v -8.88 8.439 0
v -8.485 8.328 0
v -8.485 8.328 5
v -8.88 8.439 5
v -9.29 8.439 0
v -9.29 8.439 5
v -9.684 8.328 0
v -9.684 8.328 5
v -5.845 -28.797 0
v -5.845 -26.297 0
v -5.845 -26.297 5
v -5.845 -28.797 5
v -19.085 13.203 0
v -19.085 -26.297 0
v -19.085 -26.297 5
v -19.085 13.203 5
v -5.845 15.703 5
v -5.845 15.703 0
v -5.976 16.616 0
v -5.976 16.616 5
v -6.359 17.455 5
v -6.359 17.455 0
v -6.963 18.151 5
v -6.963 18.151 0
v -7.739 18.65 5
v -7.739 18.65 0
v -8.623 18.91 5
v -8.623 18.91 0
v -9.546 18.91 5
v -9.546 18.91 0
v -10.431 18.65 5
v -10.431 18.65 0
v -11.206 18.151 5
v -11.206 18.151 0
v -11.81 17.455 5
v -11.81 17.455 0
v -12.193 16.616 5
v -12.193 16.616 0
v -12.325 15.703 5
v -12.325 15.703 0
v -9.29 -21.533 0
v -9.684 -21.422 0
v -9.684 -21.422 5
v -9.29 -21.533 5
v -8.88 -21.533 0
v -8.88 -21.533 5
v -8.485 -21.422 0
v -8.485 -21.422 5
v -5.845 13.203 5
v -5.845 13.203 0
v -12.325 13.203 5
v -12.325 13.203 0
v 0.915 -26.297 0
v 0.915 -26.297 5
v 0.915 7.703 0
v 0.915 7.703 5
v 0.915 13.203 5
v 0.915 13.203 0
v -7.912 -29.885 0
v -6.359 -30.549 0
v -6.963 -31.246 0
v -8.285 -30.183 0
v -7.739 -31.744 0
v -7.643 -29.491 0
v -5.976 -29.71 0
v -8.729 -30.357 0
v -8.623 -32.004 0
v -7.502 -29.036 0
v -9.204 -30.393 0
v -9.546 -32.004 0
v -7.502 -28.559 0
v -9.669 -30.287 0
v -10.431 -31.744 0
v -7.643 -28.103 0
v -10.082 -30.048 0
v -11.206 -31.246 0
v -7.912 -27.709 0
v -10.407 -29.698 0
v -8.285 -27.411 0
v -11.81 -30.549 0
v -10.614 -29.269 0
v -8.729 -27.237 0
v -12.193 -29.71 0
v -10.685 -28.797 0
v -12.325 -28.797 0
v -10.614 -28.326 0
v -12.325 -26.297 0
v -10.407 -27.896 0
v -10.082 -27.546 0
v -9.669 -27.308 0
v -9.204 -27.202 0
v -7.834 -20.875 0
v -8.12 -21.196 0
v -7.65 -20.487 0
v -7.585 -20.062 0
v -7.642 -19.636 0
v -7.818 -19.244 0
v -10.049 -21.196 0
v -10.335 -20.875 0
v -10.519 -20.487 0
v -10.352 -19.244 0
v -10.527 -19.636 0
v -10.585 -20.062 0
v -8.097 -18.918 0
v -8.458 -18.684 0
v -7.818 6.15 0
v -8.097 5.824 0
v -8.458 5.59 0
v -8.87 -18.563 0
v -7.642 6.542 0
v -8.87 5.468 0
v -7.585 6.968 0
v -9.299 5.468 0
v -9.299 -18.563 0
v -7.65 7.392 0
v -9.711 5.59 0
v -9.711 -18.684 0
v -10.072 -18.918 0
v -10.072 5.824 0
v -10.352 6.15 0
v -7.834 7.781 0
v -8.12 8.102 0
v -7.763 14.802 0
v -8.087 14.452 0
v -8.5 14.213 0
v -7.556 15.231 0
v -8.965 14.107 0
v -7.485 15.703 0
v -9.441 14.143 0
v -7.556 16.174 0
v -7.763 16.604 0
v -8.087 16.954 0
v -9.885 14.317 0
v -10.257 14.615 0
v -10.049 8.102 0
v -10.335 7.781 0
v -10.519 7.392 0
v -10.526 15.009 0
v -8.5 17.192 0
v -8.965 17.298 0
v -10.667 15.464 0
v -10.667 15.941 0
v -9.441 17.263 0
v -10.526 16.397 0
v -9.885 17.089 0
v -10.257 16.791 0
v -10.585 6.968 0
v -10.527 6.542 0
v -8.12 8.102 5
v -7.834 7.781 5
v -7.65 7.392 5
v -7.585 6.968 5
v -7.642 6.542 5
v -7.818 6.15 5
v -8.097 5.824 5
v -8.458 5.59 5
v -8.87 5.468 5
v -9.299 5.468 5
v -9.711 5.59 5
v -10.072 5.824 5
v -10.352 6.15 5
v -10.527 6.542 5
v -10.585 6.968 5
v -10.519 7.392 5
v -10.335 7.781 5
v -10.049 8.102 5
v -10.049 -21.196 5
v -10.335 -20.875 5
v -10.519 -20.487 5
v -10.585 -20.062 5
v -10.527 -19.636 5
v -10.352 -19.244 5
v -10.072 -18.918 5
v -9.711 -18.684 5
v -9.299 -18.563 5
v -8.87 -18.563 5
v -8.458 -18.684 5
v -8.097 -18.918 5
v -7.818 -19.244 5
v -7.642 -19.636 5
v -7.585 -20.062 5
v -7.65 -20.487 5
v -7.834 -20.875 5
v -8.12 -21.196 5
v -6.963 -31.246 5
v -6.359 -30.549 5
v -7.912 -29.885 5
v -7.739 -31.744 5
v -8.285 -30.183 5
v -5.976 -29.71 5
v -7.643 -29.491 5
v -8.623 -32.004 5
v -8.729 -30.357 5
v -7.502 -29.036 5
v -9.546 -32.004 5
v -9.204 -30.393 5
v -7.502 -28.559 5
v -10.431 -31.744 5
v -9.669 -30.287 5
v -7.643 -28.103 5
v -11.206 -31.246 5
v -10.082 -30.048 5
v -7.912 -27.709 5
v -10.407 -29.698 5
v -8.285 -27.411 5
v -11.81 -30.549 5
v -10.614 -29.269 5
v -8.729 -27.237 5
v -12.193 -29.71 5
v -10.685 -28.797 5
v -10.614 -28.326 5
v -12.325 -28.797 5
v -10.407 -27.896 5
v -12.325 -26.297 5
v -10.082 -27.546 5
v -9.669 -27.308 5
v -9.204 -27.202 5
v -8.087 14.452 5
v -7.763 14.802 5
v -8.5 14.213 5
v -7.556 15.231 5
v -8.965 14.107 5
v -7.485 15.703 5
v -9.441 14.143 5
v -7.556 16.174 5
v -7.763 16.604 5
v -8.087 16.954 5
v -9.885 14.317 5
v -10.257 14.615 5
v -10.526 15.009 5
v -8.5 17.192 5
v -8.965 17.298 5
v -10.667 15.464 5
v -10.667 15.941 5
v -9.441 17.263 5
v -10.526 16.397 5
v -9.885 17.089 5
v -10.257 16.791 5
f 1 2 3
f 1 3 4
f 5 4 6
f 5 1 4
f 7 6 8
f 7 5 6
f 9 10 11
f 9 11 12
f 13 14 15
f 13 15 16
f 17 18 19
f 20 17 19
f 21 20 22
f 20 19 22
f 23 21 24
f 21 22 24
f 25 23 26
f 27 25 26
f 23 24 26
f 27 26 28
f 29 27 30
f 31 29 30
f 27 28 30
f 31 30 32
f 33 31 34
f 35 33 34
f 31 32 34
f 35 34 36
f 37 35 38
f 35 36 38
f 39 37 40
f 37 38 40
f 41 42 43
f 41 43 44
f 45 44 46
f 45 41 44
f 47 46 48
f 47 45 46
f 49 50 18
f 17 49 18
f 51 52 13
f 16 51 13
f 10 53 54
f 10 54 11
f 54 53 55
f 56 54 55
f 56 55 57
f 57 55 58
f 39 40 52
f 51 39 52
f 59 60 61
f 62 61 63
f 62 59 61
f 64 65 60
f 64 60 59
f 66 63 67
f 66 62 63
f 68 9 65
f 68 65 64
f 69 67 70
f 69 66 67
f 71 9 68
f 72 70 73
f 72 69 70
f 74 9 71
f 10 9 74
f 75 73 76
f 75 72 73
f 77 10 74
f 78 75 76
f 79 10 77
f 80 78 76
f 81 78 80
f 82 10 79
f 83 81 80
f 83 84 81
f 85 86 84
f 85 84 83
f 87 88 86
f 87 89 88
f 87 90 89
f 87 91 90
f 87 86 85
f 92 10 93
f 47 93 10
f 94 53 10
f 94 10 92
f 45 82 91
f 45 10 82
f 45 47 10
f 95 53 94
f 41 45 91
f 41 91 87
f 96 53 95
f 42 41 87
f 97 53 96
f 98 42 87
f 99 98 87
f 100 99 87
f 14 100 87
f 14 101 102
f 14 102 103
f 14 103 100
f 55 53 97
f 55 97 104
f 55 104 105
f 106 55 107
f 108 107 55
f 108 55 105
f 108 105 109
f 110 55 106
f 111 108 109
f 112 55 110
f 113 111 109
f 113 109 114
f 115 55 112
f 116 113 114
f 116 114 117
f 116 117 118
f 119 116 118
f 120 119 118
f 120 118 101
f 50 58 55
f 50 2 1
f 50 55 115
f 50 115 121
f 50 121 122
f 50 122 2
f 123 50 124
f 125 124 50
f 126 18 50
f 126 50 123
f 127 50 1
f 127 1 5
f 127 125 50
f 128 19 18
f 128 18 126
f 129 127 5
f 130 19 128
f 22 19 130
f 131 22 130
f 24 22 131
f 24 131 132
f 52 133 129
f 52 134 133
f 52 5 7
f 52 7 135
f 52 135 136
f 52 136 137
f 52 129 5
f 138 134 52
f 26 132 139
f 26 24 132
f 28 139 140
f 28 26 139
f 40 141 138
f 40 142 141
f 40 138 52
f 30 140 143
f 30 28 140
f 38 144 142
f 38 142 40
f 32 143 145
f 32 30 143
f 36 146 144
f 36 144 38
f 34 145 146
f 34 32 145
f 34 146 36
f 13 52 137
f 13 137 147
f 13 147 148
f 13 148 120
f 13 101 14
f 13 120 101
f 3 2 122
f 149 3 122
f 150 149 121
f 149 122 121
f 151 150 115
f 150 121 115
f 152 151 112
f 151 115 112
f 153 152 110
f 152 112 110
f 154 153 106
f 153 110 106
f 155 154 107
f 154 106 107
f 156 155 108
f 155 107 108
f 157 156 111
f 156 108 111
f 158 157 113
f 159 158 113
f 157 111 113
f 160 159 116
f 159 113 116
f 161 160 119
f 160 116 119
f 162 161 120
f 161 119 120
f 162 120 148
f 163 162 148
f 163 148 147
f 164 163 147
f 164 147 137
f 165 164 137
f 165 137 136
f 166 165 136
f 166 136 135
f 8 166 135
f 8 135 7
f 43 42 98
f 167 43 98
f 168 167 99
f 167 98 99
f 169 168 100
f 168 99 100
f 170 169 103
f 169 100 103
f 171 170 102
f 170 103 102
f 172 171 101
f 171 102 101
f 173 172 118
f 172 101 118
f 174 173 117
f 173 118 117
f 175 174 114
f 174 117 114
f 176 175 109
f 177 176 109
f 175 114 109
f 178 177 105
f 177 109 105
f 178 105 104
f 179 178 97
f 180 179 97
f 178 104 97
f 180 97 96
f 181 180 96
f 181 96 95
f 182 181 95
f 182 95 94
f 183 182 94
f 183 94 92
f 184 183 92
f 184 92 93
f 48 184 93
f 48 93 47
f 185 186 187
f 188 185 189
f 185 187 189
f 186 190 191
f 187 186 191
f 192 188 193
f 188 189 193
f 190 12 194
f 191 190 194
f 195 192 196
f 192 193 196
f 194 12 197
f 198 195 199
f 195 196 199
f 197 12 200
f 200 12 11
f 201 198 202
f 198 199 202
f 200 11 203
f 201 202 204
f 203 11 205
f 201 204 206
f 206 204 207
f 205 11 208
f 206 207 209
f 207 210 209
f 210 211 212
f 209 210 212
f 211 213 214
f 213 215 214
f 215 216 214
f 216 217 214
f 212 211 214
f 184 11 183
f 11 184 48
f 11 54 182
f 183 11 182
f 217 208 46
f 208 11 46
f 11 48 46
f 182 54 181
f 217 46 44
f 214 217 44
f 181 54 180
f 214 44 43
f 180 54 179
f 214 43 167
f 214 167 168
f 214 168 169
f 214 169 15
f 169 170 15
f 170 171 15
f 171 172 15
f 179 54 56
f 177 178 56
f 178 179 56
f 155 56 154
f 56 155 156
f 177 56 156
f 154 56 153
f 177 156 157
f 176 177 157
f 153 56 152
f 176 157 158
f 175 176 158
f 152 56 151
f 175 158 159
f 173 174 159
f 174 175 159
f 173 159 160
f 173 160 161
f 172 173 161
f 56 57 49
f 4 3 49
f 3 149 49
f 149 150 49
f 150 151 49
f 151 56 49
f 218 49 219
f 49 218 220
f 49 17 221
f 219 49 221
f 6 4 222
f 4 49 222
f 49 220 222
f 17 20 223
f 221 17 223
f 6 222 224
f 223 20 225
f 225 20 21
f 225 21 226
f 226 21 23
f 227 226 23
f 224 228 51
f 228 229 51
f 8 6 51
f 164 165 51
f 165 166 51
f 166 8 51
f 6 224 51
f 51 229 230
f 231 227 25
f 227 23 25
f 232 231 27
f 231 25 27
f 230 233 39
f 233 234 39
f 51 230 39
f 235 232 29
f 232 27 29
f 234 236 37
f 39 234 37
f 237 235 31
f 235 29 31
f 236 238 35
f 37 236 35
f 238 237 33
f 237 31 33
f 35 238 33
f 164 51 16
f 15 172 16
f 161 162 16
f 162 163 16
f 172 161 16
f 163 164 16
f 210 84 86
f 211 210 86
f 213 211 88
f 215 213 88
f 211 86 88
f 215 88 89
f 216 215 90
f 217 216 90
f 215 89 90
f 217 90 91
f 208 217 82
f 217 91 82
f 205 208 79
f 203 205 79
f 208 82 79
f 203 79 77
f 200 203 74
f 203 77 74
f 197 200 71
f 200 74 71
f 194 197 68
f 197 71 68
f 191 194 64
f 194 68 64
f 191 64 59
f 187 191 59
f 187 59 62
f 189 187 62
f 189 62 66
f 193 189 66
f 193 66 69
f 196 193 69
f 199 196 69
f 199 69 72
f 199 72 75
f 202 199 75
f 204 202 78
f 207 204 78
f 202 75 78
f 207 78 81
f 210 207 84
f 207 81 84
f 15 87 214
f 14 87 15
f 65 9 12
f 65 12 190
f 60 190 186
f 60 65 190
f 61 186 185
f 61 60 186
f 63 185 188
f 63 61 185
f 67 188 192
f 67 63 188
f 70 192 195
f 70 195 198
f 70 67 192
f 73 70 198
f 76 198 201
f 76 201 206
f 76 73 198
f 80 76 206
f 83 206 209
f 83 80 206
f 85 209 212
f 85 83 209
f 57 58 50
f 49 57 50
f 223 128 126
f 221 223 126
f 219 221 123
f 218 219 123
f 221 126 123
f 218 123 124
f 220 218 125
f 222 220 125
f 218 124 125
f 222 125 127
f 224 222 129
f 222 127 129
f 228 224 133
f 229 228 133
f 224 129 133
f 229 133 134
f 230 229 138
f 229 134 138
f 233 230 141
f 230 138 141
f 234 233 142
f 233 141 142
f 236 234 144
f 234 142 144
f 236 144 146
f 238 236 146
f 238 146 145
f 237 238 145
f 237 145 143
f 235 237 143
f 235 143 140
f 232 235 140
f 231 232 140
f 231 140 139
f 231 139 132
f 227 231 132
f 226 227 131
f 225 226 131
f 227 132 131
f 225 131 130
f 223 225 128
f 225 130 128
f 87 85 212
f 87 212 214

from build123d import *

# Parameters (mm, degrees)
ESQUISSE1_R             = 1
ESQUISSE1_R_2           = 1.5
BOSS_EXTRU_1_DEPTH      = 5
ENL_V_MAT_EXTRU_1_DEPTH = 5
ESQUISSE3_W             = 20
ESQUISSE3_H             = 34
BOSS_EXTRU_2_DEPTH      = 5
ESQUISSE4_R             = 1.5
ESQUISSE4_W             = 9.798464728
ESQUISSE4_H             = 39.858161606
ENL_V_MAT_EXTRU_2_DEPTH = 5
ESQUISSE5_W             = 2.5
ESQUISSE5_H             = 34
BOSS_EXTRU_3_DEPTH      = 5
ESQUISSE6_R             = 1.6
BOSS_EXTRU_4_DEPTH      = 5
CONG_1_R                = 10
ESQUISSE7_W             = 40.251504125
ESQUISSE7_H             = 45.079075122
ENL_V_MAT_EXTRU_3_DEPTH = 10
ESQUISSE8_W             = 20
ESQUISSE8_H             = 39.5
ESQUISSE8_R             = 1.5
BOSS_EXTRU_5_DEPTH      = 5
ESQUISSE9_R             = 1.6
BOSS_EXTRU_6_DEPTH      = 5
ESQUISSE10_R            = 1.5
ENL_V_MAT_EXTRU_4_DEPTH = 10
ESQUISSE11_R            = 1.5
ENL_V_MAT_EXTRU_5_DEPTH = 10
BOSS_EXTRU_7_DEPTH      = 5


with BuildPart() as part:
    # Esquisse1 → Boss.-Extru.1 (new body)
    with BuildSketch(Plane.XY):
        with BuildLine():
            Line((-13.584596858, -30.047129187), (-13.584596858, -25.547129187))
            Line((-13.584596858, -25.547129187), (-13.584596858, -25.297129187))
            Line((-13.584596858, -25.297129187), (-13.834596858, -25.297129187))
            Line((-13.834596858, -25.297129187), (-16.334596858, -25.297129187))
            Line((-16.334596858, -25.297129187), (-16.584596858, -25.297129187))
            Line((-16.584596858, -25.297129187), (-16.584596858, -25.047129187))
            Line((-16.584596858, -25.047129187), (-16.584596858, 6.452870813))
            Line((-16.584596858, 6.452870813), (-16.584596858, 6.702870813))
            Line((-16.584596858, 6.702870813), (-16.334596858, 6.702870813))
            Line((-16.334596858, 6.702870813), (-13.834596858, 6.702870813))
            Line((-13.834596858, 6.702870813), (-13.584596858, 6.702870813))
            Line((-13.584596858, 6.702870813), (-13.584596858, 6.952870813))
            Line((-13.584596858, 6.952870813), (-13.584596858, 11.452870813))
            Line((-13.584596858, 11.452870813), (-13.584596858, 11.702870813))
            Line((-13.584596858, 11.702870813), (-13.334596858, 11.702870813))
            Line((-13.334596858, 11.702870813), (-8.584596858, 11.702870813))
            Line((-8.584596858, 11.702870813), (-8.584596858, 6.702870813))
            Line((-8.584596858, 6.702870813), (-7.491776281, 6.702870813))
            Line((-7.491776281, 6.702870813), (-4.034541178, 6.702870813))
            ThreePointArc((-4.034541178, 6.702870813), (-0.161557832, 6.19424756), (3.448773595, 4.702870813))
            ThreePointArc((3.448773595, 4.702870813), (10.66943645, 1.720117321), (18.415403142, 0.702870813))
            ThreePointArc((18.415403142, 0.702870813), (28.415403142, -9.297129187), (18.415403142, -19.297129187))
            ThreePointArc((18.415403142, -19.297129187), (10.66943645, -20.314375694), (3.448773595, -23.297129187))
            ThreePointArc((3.448773595, -23.297129187), (-0.161557832, -24.788505933), (-4.034541178, -25.297129187))
            Line((-4.034541178, -25.297129187), (-7.491776281, -25.297129187))
            Line((-7.491776281, -25.297129187), (-8.584596858, -25.297129187))
            Line((-8.584596858, -25.297129187), (-8.584596858, -30.297129187))
            Line((-8.584596858, -30.297129187), (-13.334596858, -30.297129187))
            Line((-13.334596858, -30.297129187), (-13.584596858, -30.297129187))
            Line((-13.584596858, -30.297129187), (-13.584596858, -30.047129187))
        make_face()
        with Locations((18.477857718, -2.297129187)):
            Circle(ESQUISSE1_R, mode=Mode.SUBTRACT)
        with Locations((25.415403142, -9.359583762)):
            Circle(ESQUISSE1_R, mode=Mode.SUBTRACT)
        with Locations((18.415403142, -9.297129187)):
            Circle(ESQUISSE1_R_2, mode=Mode.SUBTRACT)
        with Locations((11.415403142, -9.234674611)):
            Circle(ESQUISSE1_R, mode=Mode.SUBTRACT)
        with Locations((18.352948567, -16.297129187)):
            Circle(ESQUISSE1_R, mode=Mode.SUBTRACT)
    extrude(amount=BOSS_EXTRU_1_DEPTH)

    # Esquisse2 → Enlèv. mat.-Extru.1 (cut)
    with BuildSketch(Plane(origin=(0, 0, 0), x_dir=(-1, 0, 0), z_dir=(0, 0, -1))):
        Polygon((1.584596858, -19.297129187), (1.584596858, -25.297129187), (1.584596858, -26.297129187), (21.584596858, -26.297129187), (21.584596858, -33.65697819), (-26.833247513, -33.65697819), (-26.198667142, -19.297129187), align=None)
        Polygon((21.584596858, 7.702870813), (1.584596858, 7.702870813), (1.584596858, 6.702870813), (1.584596858, 0.702870813), (-26.198667142, 0.702870813), (-26.833247513, 15.062719816), (21.584596858, 15.062719816), align=None)
    extrude(amount=-ENL_V_MAT_EXTRU_1_DEPTH, mode=Mode.SUBTRACT)

    # Esquisse3 → Boss.-Extru.2 (add)
    with BuildSketch(Plane(origin=(0, 0, 0), x_dir=(-1, 0, 0), z_dir=(0, 0, -1))):
        with Locations((11.584596858, -9.297129187)):
            Rectangle(ESQUISSE3_W, ESQUISSE3_H)
    extrude(amount=-BOSS_EXTRU_2_DEPTH)

    # Esquisse4 → Enlèv. mat.-Extru.2 (cut)
    with BuildSketch(Plane(origin=(0, 0, 0), x_dir=(-1, 0, 0), z_dir=(0, 0, -1))):
        with Locations((9.084596858, -22.797129187)):
            Circle(ESQUISSE4_R)
        with Locations((9.084596858, 4.202870813)):
            Circle(ESQUISSE4_R)
        with Locations((23.983829222, -9.020336398)):
            Rectangle(ESQUISSE4_W, ESQUISSE4_H)
    extrude(amount=-ENL_V_MAT_EXTRU_2_DEPTH, mode=Mode.SUBTRACT)

    # Esquisse5 → Boss.-Extru.3 (add)
    with BuildSketch(Plane(origin=(0, 0, 0), x_dir=(-1, 0, 0), z_dir=(0, 0, -1))):
        with Locations((0.334596858, -9.297129187)):
            Rectangle(ESQUISSE5_W, ESQUISSE5_H)
    extrude(amount=-BOSS_EXTRU_3_DEPTH)

    # Esquisse6 → Boss.-Extru.4 (add)
    # profile 1 of 2: a face of its own
    with BuildSketch(Plane(origin=(0, 0, 0), x_dir=(-1, 0, 0), z_dir=(0, 0, -1))):
        with BuildLine():
            Line((12.324596858, -25.12480516), (5.844596858, -25.12480516))
            Line((5.844596858, -25.12480516), (5.844596858, -28.797129187))
            ThreePointArc((5.844596858, -28.797129187), (9.084596858, -32.037129187), (12.324596858, -28.797129187))
            Line((12.324596858, -28.797129187), (12.324596858, -25.12480516))
        make_face()
        with Locations((9.084596858, -28.797129187)):
            Circle(ESQUISSE6_R, mode=Mode.SUBTRACT)
    # profile 2 of 2: a face of its own
    with BuildSketch(Plane(origin=(0, 0, 0), x_dir=(-1, 0, 0), z_dir=(0, 0, -1))):
        with BuildLine():
            Line((12.324596858, 6.757738308), (5.844596858, 6.757738308))
            Line((5.844596858, 6.757738308), (5.844596858, 10.202870813))
            ThreePointArc((5.844596858, 10.202870813), (9.084596858, 13.442870813), (12.324596858, 10.202870813))
            Line((12.324596858, 10.202870813), (12.324596858, 6.757738308))
        make_face()
        with Locations((9.084596858, 10.202870813)):
            Circle(ESQUISSE6_R, mode=Mode.SUBTRACT)
    extrude(amount=-BOSS_EXTRU_4_DEPTH)

    # Congé1
    # the kernel refuses this fillet: 10 mm, written as the material it adds along each edge
    with BuildSketch(Plane(origin=(0.915403142, 0.702870813, 0), x_dir=(1, 0, 0), z_dir=(0, 0, 1))) as cong_1_piece_1:
        with BuildLine():
            CenterArc((9.539392014, 10), CONG_1_R, 197.457603124, 72.542396876)
            Line((0, 7), (-0.19078784, 6.94))
            ThreePointArc((-0.19078784, 6.94), (-0.2, 3.5), (-0.2, 0))
            Line((-0.2, 0), (0, -0.2))
            Line((0, -0.2), (9.539392014, -0.2))
            Line((9.539392014, -0.2), (9.539392014, 0))
        make_face()
    extrude(amount=5)
    with BuildSketch(Plane(origin=(0.915403142, -19.297129187, 5), x_dir=(0, -1, 0), z_dir=(0, 0, -1))) as cong_1_piece_2:
        with BuildLine():
            CenterArc((10, -9.539392014), CONG_1_R, 107.457603124, 72.542396876)
            Line((0, -9.539392014), (-0.2, -9.539392014))
            Line((-0.2, -9.539392014), (-0.2, 0))
            Line((-0.2, 0), (0, 0.2))
            ThreePointArc((0, 0.2), (3.5, 0.2), (6.94, 0.19078784))
            Line((6.94, 0.19078784), (7, 0))
        make_face()
    extrude(amount=5)

    # Esquisse7 → Enlèv. mat.-Extru.3 (cut)
    with BuildSketch(Plane(origin=(0, 0, 0), x_dir=(-1, 0, 0), z_dir=(0, 0, -1))):
        with Locations((-21.041155205, -11.091158949)):
            Rectangle(ESQUISSE7_W, ESQUISSE7_H)
    extrude(amount=-ENL_V_MAT_EXTRU_3_DEPTH, mode=Mode.SUBTRACT)

    # Esquisse8 → Boss.-Extru.5 (add)
    with BuildSketch(Plane(origin=(0, 0, 0), x_dir=(-1, 0, 0), z_dir=(0, 0, -1))):
        with Locations((9.084596858, -6.547129187)):
            Rectangle(ESQUISSE8_W, ESQUISSE8_H)
        with Locations((9.084596858, -22.797129187)):
            Circle(ESQUISSE8_R, mode=Mode.SUBTRACT)
    extrude(amount=-BOSS_EXTRU_5_DEPTH)

    # Esquisse9 → Boss.-Extru.6 (add)
    with BuildSketch(Plane(origin=(0, 0, 0), x_dir=(-1, 0, 0), z_dir=(0, 0, -1))):
        with BuildLine():
            Line((12.324596858, 15.702870813), (12.324596858, 13.202870813))
            Line((12.324596858, 13.202870813), (10.308361541, 13.202870813))
            ThreePointArc((10.308361541, 13.202870813), (9.084596858, 13.442870813), (7.860832174, 13.202870813))
            Line((7.860832174, 13.202870813), (5.844596858, 13.202870813))
            Line((5.844596858, 13.202870813), (5.844596858, 15.702870813))
            ThreePointArc((5.844596858, 15.702870813), (9.084596858, 18.942870813), (12.324596858, 15.702870813))
        make_face()
        with Locations(Location((9.084596858, 15.702870813, 0), (0, 0, 180))):
            Circle(ESQUISSE9_R, mode=Mode.SUBTRACT)
    extrude(amount=-BOSS_EXTRU_6_DEPTH)

    # Esquisse10 → Enlèv. mat.-Extru.4 (cut)
    with BuildSketch(Plane(origin=(0, 0, 0), x_dir=(-1, 0, 0), z_dir=(0, 0, -1))):
        with Locations(Location((9.084596858, 9.702870813, 0), (0, 0, 180))):
            Circle(ESQUISSE10_R)
    extrude(amount=-ENL_V_MAT_EXTRU_4_DEPTH, mode=Mode.SUBTRACT)

    # Esquisse11 → Enlèv. mat.-Extru.5 (cut)
    with BuildSketch(Plane(origin=(0, 0, 0), x_dir=(-1, 0, 0), z_dir=(0, 0, -1))):
        with Locations((9.084596858, -20.047129187)):
            Circle(ESQUISSE11_R)
        with Locations((9.084596858, 6.952870813)):
            Circle(ESQUISSE11_R)
    extrude(amount=-ENL_V_MAT_EXTRU_5_DEPTH, mode=Mode.SUBTRACT)

    # Esquisse12 → Boss.-Extru.7 (add)
    with BuildSketch(Plane(origin=(0, 0, 0), x_dir=(-1, 0, 0), z_dir=(0, 0, -1))):
        with BuildLine():
            ThreePointArc((9.684075798, 8.327870813), (9.084596858, 11.202870813), (8.485117917, 8.327870813))
            ThreePointArc((8.485117917, 8.327870813), (9.084596858, 8.452870813), (9.684075798, 8.327870813))
        make_face()
        with BuildLine():
            ThreePointArc((8.485117917, -21.422129187), (9.084596858, -24.297129187), (9.684075798, -21.422129187))
            ThreePointArc((9.684075798, -21.422129187), (9.084596858, -21.547129187), (8.485117917, -21.422129187))
        make_face()
    extrude(amount=-BOSS_EXTRU_7_DEPTH)


solid = part.part
